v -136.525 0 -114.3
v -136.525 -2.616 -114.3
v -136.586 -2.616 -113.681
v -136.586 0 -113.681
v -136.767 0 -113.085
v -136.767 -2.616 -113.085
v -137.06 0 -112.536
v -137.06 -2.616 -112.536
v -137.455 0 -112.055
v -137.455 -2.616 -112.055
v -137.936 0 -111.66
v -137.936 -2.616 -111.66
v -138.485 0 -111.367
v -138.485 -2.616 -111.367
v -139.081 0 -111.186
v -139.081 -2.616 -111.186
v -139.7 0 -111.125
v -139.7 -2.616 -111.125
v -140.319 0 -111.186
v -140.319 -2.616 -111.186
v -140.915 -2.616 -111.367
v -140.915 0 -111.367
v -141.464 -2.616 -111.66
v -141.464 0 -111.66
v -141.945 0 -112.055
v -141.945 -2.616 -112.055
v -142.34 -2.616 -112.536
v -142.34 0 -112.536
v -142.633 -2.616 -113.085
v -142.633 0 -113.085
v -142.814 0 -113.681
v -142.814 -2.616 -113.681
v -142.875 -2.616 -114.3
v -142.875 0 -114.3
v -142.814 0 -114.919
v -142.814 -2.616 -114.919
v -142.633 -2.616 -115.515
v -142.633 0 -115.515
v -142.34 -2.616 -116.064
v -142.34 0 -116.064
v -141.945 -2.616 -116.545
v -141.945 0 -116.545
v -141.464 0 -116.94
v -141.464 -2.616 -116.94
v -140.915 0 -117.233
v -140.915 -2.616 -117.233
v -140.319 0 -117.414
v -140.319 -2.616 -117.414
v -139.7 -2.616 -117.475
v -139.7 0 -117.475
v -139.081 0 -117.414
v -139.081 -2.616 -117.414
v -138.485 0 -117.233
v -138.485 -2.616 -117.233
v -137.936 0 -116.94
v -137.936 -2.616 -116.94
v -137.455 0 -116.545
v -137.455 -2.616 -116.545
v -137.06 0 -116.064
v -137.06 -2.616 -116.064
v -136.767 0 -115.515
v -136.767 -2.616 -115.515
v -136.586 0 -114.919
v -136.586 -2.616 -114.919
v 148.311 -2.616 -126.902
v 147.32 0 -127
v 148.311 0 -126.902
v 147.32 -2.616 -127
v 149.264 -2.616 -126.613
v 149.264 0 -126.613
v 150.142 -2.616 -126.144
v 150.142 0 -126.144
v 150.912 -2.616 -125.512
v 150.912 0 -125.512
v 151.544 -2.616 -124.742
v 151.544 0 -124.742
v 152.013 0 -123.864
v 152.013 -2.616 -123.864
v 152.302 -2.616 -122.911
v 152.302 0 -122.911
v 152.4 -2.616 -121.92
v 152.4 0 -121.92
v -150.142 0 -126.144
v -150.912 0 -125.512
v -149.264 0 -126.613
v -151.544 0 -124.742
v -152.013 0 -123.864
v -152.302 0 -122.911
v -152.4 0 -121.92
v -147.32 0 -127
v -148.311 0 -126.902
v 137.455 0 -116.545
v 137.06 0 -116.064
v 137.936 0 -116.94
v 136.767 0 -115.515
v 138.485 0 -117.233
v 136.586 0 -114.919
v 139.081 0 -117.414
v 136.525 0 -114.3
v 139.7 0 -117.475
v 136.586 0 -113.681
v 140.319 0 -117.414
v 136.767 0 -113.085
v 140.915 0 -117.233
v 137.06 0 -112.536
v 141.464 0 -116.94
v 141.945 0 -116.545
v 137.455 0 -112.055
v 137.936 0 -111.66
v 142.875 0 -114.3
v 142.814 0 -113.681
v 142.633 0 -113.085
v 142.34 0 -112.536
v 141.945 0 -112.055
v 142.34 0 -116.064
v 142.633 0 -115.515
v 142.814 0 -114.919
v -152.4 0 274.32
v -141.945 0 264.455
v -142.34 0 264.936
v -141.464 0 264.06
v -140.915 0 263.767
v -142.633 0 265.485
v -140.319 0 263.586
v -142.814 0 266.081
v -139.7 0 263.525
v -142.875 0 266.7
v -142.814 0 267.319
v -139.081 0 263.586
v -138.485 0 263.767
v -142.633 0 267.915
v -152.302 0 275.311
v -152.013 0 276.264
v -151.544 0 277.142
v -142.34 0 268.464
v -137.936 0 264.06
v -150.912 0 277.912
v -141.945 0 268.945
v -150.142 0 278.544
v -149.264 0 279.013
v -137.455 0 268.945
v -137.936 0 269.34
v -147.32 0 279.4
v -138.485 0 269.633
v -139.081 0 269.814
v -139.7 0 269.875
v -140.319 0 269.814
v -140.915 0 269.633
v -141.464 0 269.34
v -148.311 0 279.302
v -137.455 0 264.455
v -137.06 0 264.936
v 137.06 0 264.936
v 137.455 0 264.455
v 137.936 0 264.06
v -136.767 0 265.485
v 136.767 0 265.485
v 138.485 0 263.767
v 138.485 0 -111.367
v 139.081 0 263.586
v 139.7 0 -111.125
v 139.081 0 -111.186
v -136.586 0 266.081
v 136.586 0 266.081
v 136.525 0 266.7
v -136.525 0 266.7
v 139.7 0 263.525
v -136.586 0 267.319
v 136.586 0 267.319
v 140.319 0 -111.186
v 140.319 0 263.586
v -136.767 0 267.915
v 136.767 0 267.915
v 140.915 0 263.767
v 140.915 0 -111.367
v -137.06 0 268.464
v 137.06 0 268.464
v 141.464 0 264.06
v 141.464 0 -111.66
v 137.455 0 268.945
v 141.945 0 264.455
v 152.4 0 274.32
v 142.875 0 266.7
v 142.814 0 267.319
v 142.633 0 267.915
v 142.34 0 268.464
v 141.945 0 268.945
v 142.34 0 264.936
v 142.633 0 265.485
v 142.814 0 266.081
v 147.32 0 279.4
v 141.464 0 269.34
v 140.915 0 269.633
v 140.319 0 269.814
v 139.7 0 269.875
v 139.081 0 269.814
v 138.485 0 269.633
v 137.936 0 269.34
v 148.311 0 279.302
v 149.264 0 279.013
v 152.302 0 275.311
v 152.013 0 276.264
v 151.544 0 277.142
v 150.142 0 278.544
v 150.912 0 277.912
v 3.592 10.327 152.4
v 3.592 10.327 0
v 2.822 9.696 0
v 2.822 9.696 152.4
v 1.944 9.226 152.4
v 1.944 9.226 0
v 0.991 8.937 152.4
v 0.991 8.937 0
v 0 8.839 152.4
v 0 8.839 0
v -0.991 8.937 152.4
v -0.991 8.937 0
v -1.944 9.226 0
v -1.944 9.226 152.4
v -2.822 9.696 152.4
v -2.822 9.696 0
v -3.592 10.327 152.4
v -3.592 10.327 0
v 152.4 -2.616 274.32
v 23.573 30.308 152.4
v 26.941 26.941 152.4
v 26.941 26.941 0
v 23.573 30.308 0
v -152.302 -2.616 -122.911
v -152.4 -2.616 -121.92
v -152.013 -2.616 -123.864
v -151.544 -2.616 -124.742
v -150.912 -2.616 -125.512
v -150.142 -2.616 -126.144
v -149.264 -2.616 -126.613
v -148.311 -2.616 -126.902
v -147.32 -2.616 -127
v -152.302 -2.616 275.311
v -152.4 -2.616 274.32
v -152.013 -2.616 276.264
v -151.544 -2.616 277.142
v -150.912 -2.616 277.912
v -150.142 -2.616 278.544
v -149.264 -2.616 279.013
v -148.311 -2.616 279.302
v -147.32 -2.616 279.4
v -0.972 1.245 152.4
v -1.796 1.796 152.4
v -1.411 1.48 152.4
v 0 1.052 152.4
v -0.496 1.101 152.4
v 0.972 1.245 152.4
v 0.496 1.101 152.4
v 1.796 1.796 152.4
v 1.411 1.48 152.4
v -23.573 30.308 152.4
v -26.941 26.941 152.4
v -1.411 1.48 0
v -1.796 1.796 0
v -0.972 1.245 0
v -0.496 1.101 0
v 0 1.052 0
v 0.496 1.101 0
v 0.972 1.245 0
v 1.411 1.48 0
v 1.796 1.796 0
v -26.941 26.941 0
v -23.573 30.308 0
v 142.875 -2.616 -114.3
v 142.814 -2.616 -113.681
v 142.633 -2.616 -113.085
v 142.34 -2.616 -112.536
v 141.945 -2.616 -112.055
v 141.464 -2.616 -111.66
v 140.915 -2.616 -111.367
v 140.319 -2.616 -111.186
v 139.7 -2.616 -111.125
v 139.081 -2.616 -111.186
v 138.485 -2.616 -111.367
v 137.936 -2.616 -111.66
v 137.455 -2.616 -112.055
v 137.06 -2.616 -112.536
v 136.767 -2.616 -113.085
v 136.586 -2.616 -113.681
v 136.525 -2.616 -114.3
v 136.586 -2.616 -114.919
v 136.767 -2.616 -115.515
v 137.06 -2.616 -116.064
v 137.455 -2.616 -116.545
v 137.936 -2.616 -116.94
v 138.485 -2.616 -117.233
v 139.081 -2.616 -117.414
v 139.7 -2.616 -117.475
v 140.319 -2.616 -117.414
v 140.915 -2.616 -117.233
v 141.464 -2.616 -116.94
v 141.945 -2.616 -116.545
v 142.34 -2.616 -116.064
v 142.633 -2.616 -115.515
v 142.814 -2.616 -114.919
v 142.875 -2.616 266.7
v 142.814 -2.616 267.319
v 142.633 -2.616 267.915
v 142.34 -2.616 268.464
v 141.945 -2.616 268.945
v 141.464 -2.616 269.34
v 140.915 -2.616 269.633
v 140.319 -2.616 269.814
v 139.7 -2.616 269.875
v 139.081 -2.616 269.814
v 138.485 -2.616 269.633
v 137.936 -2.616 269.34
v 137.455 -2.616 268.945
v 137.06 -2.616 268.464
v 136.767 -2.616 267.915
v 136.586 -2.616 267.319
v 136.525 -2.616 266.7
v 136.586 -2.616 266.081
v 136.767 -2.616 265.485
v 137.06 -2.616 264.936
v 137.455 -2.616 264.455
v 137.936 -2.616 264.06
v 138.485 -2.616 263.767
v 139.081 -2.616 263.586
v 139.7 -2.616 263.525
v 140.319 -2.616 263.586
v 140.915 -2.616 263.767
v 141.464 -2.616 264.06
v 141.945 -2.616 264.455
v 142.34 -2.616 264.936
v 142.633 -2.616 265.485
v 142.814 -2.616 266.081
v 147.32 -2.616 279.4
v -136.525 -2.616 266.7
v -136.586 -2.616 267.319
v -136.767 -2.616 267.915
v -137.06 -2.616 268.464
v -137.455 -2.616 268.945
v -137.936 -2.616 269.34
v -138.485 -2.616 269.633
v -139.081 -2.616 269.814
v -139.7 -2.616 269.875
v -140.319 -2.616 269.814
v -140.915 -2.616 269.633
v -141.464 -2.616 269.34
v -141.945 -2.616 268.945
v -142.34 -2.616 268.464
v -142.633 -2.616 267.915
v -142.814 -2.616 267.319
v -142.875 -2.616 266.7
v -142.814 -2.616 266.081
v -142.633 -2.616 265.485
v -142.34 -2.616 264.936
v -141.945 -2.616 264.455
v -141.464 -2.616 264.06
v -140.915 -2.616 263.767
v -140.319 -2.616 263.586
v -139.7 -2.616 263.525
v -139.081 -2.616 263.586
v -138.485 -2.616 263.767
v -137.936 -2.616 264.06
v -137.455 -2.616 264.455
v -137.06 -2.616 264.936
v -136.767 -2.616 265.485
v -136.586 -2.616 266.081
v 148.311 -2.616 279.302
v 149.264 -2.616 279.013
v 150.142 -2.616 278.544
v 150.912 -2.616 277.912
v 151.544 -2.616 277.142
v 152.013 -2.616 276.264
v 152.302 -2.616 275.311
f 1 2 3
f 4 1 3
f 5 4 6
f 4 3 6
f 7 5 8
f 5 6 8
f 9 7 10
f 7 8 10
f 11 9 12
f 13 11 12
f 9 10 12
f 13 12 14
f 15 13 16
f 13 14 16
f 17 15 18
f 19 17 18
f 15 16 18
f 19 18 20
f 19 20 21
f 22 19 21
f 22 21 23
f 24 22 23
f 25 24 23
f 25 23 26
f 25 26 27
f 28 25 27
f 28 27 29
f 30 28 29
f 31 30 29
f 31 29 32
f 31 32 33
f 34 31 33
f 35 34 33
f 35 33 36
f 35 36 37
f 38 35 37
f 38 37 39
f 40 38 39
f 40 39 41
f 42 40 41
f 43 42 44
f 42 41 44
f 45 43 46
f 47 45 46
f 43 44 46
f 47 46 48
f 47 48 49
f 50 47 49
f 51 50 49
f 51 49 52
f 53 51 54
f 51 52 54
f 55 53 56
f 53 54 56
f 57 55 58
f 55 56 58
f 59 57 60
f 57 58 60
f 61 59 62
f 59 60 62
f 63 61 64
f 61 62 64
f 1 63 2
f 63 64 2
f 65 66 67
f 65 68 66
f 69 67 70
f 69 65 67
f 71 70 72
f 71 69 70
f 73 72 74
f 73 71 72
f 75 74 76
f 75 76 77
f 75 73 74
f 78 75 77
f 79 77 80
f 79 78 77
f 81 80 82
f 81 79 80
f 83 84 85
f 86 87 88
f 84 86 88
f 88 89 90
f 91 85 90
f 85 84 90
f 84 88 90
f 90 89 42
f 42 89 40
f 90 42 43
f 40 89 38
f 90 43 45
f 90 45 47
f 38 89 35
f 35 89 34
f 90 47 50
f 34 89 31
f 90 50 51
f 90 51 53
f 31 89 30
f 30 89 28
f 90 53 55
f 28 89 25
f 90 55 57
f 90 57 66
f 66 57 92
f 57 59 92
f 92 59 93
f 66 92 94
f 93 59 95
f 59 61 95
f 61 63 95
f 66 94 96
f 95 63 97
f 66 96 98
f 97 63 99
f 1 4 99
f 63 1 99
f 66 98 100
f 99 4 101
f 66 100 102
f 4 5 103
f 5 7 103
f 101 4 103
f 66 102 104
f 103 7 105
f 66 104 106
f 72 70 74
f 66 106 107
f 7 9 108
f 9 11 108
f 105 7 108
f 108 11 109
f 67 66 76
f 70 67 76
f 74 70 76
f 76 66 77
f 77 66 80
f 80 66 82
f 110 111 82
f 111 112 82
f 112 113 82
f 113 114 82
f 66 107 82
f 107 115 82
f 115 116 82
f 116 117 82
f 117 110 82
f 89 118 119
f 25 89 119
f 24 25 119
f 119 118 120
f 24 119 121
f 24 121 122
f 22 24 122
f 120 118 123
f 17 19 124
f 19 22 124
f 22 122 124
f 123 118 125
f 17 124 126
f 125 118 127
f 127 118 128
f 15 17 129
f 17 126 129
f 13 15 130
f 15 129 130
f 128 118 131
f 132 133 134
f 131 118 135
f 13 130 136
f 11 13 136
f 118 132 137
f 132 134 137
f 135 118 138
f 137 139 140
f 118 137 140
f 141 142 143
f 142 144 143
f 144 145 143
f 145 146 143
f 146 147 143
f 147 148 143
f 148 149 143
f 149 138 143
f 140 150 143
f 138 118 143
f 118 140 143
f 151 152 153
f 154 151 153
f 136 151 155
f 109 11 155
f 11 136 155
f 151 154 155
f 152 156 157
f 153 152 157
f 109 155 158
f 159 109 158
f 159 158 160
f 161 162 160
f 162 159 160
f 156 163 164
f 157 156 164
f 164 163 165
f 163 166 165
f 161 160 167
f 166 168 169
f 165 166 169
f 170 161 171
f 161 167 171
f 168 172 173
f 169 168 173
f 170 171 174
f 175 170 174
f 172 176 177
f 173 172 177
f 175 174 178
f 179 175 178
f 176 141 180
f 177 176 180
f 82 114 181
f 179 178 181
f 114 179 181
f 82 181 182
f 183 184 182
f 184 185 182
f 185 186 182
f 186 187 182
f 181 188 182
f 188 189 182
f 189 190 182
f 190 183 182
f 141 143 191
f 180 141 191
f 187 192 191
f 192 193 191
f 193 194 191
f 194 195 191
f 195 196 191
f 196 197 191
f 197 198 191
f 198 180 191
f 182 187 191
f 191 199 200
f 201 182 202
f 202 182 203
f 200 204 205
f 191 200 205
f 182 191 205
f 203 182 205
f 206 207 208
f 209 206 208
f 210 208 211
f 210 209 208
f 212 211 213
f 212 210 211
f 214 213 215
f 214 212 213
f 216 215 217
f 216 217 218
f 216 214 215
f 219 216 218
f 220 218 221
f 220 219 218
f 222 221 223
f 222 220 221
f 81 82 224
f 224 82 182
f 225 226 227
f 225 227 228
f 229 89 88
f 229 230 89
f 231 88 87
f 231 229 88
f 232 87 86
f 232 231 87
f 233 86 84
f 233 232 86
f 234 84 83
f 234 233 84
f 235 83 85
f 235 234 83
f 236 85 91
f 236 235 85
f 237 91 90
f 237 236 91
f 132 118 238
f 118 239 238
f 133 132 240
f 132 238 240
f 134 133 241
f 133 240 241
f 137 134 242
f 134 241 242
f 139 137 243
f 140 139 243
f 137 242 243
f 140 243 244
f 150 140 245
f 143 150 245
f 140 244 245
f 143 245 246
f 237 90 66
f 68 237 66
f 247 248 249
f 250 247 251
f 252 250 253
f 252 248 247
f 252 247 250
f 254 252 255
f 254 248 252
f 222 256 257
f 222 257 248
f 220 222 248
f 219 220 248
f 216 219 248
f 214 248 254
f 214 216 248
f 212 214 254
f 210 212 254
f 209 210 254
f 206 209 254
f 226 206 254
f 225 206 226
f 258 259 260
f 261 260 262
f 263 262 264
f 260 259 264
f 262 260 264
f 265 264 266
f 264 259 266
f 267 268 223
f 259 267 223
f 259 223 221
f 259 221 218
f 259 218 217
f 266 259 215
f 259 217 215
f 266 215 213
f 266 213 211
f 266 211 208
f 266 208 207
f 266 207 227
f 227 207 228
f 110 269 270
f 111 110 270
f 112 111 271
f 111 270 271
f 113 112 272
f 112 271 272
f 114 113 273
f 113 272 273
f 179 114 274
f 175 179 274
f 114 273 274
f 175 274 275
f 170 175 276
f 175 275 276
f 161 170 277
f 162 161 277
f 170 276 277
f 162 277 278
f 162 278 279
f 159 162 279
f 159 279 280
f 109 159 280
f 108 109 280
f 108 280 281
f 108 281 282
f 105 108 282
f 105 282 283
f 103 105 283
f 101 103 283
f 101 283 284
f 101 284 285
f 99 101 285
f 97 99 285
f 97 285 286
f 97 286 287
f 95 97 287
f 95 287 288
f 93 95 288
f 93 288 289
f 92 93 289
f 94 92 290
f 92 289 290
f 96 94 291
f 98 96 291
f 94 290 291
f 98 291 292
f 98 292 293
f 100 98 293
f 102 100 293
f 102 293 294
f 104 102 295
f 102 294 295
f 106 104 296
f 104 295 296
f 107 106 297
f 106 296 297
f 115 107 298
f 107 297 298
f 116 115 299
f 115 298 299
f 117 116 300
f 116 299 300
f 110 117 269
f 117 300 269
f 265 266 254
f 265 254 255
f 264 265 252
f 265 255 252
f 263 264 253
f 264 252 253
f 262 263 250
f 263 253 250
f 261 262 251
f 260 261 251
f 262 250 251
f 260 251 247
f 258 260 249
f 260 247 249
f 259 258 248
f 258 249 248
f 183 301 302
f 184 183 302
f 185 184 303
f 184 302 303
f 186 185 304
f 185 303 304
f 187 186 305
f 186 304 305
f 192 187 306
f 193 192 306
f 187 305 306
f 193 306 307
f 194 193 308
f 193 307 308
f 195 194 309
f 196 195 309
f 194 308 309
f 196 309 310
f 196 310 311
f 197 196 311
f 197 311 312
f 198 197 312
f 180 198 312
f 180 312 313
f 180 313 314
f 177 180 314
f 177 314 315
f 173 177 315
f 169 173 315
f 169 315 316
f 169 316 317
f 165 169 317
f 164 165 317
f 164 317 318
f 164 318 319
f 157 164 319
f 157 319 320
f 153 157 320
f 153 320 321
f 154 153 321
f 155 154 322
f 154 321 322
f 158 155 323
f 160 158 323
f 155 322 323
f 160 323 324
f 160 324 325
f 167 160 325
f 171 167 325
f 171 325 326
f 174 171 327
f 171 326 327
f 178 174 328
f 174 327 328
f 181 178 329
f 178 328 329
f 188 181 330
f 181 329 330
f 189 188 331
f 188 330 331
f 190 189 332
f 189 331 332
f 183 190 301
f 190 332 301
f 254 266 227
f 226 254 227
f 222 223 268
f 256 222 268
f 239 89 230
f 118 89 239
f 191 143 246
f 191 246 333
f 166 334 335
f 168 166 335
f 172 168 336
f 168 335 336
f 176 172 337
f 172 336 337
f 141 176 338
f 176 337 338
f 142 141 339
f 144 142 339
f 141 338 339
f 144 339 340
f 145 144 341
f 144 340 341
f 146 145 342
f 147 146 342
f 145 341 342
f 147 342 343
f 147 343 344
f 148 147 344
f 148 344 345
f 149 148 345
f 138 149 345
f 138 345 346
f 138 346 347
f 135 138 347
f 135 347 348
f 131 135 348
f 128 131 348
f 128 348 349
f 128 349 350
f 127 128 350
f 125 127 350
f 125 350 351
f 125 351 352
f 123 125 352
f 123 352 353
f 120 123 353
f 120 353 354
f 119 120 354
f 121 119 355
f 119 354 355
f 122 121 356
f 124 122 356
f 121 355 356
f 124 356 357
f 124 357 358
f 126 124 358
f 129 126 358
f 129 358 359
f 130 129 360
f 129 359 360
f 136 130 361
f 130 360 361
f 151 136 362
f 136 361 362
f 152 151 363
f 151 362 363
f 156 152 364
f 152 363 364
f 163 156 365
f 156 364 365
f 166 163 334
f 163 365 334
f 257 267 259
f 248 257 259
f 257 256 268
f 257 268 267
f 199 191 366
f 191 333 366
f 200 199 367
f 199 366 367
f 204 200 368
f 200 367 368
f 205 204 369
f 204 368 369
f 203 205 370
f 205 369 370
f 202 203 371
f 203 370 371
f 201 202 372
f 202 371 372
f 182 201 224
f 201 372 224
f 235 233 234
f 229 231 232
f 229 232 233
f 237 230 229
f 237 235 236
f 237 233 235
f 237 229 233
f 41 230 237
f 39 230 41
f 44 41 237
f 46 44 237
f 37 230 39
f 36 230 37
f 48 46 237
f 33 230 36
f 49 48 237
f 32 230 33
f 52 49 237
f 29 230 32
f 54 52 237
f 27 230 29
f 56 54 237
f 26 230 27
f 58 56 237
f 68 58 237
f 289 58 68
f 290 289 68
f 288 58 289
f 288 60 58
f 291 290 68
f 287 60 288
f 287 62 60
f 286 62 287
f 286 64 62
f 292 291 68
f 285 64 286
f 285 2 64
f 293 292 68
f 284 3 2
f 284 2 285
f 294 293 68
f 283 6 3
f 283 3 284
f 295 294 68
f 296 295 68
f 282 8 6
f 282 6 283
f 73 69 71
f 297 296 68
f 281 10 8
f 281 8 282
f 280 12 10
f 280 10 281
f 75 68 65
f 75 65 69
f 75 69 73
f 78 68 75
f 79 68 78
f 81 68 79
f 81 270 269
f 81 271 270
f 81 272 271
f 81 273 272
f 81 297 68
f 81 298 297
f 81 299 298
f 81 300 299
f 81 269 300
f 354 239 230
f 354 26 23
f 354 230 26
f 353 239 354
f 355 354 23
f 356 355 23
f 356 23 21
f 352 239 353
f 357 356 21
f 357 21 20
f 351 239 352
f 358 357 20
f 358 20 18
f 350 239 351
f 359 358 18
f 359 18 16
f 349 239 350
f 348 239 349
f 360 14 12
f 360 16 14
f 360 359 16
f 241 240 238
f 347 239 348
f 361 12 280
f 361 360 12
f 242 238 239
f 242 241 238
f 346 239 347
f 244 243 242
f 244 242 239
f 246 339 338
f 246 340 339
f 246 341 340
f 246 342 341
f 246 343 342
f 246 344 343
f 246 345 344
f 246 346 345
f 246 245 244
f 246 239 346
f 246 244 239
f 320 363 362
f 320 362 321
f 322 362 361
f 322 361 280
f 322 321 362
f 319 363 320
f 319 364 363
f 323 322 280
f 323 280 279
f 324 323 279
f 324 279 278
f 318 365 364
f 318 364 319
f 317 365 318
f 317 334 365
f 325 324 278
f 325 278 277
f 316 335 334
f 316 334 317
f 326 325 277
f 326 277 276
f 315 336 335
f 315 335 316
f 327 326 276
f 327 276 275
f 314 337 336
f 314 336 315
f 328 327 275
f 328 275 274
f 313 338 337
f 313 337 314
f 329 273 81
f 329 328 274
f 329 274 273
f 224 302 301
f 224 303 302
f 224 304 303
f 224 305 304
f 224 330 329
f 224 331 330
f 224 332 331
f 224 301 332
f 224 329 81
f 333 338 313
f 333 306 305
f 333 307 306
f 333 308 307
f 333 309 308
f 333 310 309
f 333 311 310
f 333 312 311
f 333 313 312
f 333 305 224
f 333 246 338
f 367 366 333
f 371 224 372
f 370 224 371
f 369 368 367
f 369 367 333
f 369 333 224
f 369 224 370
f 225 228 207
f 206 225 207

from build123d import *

# Parameters (mm, degrees)
F1_DEPTH = 152.4
F2_R     = 5.08
F3_R     = 2.54
F4_W     = 304.8
F4_H     = 406.4
F5_DEPTH = 2.6162
F6_R     = 3.175
F7_DEPTH = 32.925564
F8_R     = 5.08


with BuildPart() as f1:
    # F0 (on Top) → F1 (new body)
    with BuildSketch(Plane.XY):
        Polygon((-23.573172, 30.308364), (-26.940768, 26.940768), (0, 0), (26.940768, 26.940768), (23.573172, 30.308364), (0, 6.735192), align=None)
    extrude(amount=F1_DEPTH)

    # F2
    f2_edges = [f1.edges().sort_by_distance(p)[0] for p in [
        (0, 6.735192, 76.2),
    ]]
    fillet(f2_edges, radius=F2_R)

    # F3
    f3_edges = [f1.edges().sort_by_distance(p)[0] for p in [
        (0, 0, 76.2),
    ]]
    fillet(f3_edges, radius=F3_R)


with BuildPart() as f5:
    # F4 (on Front) → F5 (new body)
    with BuildSketch(Plane.XZ):
        with Locations((0, 76.2)):
            Rectangle(F4_W, F4_H)
    extrude(amount=F5_DEPTH)

    # F6 (on face) → F7 (cut, through all)
    with BuildSketch(Plane.XZ.offset(2.6162)):
        with Locations((-139.7, 266.7)):
            Circle(F6_R)
        with Locations((139.7, 266.7)):
            Circle(F6_R)
        with Locations((139.7, -114.3)):
            Circle(F6_R)
        with Locations((-139.7, -114.3)):
            Circle(F6_R)
    extrude(amount=-F7_DEPTH, mode=Mode.SUBTRACT)

    # F8
    f8_edges = [f5.edges().sort_by_distance(p)[0] for p in [
        (-152.4, -1.3081, 279.4),
        (152.4, -1.3081, 279.4),
        (152.4, -1.3081, -127),
        (-152.4, -1.3081, -127),
    ]]
    fillet(f8_edges, radius=F8_R)


solid = Compound([f1.part, f5.part])
